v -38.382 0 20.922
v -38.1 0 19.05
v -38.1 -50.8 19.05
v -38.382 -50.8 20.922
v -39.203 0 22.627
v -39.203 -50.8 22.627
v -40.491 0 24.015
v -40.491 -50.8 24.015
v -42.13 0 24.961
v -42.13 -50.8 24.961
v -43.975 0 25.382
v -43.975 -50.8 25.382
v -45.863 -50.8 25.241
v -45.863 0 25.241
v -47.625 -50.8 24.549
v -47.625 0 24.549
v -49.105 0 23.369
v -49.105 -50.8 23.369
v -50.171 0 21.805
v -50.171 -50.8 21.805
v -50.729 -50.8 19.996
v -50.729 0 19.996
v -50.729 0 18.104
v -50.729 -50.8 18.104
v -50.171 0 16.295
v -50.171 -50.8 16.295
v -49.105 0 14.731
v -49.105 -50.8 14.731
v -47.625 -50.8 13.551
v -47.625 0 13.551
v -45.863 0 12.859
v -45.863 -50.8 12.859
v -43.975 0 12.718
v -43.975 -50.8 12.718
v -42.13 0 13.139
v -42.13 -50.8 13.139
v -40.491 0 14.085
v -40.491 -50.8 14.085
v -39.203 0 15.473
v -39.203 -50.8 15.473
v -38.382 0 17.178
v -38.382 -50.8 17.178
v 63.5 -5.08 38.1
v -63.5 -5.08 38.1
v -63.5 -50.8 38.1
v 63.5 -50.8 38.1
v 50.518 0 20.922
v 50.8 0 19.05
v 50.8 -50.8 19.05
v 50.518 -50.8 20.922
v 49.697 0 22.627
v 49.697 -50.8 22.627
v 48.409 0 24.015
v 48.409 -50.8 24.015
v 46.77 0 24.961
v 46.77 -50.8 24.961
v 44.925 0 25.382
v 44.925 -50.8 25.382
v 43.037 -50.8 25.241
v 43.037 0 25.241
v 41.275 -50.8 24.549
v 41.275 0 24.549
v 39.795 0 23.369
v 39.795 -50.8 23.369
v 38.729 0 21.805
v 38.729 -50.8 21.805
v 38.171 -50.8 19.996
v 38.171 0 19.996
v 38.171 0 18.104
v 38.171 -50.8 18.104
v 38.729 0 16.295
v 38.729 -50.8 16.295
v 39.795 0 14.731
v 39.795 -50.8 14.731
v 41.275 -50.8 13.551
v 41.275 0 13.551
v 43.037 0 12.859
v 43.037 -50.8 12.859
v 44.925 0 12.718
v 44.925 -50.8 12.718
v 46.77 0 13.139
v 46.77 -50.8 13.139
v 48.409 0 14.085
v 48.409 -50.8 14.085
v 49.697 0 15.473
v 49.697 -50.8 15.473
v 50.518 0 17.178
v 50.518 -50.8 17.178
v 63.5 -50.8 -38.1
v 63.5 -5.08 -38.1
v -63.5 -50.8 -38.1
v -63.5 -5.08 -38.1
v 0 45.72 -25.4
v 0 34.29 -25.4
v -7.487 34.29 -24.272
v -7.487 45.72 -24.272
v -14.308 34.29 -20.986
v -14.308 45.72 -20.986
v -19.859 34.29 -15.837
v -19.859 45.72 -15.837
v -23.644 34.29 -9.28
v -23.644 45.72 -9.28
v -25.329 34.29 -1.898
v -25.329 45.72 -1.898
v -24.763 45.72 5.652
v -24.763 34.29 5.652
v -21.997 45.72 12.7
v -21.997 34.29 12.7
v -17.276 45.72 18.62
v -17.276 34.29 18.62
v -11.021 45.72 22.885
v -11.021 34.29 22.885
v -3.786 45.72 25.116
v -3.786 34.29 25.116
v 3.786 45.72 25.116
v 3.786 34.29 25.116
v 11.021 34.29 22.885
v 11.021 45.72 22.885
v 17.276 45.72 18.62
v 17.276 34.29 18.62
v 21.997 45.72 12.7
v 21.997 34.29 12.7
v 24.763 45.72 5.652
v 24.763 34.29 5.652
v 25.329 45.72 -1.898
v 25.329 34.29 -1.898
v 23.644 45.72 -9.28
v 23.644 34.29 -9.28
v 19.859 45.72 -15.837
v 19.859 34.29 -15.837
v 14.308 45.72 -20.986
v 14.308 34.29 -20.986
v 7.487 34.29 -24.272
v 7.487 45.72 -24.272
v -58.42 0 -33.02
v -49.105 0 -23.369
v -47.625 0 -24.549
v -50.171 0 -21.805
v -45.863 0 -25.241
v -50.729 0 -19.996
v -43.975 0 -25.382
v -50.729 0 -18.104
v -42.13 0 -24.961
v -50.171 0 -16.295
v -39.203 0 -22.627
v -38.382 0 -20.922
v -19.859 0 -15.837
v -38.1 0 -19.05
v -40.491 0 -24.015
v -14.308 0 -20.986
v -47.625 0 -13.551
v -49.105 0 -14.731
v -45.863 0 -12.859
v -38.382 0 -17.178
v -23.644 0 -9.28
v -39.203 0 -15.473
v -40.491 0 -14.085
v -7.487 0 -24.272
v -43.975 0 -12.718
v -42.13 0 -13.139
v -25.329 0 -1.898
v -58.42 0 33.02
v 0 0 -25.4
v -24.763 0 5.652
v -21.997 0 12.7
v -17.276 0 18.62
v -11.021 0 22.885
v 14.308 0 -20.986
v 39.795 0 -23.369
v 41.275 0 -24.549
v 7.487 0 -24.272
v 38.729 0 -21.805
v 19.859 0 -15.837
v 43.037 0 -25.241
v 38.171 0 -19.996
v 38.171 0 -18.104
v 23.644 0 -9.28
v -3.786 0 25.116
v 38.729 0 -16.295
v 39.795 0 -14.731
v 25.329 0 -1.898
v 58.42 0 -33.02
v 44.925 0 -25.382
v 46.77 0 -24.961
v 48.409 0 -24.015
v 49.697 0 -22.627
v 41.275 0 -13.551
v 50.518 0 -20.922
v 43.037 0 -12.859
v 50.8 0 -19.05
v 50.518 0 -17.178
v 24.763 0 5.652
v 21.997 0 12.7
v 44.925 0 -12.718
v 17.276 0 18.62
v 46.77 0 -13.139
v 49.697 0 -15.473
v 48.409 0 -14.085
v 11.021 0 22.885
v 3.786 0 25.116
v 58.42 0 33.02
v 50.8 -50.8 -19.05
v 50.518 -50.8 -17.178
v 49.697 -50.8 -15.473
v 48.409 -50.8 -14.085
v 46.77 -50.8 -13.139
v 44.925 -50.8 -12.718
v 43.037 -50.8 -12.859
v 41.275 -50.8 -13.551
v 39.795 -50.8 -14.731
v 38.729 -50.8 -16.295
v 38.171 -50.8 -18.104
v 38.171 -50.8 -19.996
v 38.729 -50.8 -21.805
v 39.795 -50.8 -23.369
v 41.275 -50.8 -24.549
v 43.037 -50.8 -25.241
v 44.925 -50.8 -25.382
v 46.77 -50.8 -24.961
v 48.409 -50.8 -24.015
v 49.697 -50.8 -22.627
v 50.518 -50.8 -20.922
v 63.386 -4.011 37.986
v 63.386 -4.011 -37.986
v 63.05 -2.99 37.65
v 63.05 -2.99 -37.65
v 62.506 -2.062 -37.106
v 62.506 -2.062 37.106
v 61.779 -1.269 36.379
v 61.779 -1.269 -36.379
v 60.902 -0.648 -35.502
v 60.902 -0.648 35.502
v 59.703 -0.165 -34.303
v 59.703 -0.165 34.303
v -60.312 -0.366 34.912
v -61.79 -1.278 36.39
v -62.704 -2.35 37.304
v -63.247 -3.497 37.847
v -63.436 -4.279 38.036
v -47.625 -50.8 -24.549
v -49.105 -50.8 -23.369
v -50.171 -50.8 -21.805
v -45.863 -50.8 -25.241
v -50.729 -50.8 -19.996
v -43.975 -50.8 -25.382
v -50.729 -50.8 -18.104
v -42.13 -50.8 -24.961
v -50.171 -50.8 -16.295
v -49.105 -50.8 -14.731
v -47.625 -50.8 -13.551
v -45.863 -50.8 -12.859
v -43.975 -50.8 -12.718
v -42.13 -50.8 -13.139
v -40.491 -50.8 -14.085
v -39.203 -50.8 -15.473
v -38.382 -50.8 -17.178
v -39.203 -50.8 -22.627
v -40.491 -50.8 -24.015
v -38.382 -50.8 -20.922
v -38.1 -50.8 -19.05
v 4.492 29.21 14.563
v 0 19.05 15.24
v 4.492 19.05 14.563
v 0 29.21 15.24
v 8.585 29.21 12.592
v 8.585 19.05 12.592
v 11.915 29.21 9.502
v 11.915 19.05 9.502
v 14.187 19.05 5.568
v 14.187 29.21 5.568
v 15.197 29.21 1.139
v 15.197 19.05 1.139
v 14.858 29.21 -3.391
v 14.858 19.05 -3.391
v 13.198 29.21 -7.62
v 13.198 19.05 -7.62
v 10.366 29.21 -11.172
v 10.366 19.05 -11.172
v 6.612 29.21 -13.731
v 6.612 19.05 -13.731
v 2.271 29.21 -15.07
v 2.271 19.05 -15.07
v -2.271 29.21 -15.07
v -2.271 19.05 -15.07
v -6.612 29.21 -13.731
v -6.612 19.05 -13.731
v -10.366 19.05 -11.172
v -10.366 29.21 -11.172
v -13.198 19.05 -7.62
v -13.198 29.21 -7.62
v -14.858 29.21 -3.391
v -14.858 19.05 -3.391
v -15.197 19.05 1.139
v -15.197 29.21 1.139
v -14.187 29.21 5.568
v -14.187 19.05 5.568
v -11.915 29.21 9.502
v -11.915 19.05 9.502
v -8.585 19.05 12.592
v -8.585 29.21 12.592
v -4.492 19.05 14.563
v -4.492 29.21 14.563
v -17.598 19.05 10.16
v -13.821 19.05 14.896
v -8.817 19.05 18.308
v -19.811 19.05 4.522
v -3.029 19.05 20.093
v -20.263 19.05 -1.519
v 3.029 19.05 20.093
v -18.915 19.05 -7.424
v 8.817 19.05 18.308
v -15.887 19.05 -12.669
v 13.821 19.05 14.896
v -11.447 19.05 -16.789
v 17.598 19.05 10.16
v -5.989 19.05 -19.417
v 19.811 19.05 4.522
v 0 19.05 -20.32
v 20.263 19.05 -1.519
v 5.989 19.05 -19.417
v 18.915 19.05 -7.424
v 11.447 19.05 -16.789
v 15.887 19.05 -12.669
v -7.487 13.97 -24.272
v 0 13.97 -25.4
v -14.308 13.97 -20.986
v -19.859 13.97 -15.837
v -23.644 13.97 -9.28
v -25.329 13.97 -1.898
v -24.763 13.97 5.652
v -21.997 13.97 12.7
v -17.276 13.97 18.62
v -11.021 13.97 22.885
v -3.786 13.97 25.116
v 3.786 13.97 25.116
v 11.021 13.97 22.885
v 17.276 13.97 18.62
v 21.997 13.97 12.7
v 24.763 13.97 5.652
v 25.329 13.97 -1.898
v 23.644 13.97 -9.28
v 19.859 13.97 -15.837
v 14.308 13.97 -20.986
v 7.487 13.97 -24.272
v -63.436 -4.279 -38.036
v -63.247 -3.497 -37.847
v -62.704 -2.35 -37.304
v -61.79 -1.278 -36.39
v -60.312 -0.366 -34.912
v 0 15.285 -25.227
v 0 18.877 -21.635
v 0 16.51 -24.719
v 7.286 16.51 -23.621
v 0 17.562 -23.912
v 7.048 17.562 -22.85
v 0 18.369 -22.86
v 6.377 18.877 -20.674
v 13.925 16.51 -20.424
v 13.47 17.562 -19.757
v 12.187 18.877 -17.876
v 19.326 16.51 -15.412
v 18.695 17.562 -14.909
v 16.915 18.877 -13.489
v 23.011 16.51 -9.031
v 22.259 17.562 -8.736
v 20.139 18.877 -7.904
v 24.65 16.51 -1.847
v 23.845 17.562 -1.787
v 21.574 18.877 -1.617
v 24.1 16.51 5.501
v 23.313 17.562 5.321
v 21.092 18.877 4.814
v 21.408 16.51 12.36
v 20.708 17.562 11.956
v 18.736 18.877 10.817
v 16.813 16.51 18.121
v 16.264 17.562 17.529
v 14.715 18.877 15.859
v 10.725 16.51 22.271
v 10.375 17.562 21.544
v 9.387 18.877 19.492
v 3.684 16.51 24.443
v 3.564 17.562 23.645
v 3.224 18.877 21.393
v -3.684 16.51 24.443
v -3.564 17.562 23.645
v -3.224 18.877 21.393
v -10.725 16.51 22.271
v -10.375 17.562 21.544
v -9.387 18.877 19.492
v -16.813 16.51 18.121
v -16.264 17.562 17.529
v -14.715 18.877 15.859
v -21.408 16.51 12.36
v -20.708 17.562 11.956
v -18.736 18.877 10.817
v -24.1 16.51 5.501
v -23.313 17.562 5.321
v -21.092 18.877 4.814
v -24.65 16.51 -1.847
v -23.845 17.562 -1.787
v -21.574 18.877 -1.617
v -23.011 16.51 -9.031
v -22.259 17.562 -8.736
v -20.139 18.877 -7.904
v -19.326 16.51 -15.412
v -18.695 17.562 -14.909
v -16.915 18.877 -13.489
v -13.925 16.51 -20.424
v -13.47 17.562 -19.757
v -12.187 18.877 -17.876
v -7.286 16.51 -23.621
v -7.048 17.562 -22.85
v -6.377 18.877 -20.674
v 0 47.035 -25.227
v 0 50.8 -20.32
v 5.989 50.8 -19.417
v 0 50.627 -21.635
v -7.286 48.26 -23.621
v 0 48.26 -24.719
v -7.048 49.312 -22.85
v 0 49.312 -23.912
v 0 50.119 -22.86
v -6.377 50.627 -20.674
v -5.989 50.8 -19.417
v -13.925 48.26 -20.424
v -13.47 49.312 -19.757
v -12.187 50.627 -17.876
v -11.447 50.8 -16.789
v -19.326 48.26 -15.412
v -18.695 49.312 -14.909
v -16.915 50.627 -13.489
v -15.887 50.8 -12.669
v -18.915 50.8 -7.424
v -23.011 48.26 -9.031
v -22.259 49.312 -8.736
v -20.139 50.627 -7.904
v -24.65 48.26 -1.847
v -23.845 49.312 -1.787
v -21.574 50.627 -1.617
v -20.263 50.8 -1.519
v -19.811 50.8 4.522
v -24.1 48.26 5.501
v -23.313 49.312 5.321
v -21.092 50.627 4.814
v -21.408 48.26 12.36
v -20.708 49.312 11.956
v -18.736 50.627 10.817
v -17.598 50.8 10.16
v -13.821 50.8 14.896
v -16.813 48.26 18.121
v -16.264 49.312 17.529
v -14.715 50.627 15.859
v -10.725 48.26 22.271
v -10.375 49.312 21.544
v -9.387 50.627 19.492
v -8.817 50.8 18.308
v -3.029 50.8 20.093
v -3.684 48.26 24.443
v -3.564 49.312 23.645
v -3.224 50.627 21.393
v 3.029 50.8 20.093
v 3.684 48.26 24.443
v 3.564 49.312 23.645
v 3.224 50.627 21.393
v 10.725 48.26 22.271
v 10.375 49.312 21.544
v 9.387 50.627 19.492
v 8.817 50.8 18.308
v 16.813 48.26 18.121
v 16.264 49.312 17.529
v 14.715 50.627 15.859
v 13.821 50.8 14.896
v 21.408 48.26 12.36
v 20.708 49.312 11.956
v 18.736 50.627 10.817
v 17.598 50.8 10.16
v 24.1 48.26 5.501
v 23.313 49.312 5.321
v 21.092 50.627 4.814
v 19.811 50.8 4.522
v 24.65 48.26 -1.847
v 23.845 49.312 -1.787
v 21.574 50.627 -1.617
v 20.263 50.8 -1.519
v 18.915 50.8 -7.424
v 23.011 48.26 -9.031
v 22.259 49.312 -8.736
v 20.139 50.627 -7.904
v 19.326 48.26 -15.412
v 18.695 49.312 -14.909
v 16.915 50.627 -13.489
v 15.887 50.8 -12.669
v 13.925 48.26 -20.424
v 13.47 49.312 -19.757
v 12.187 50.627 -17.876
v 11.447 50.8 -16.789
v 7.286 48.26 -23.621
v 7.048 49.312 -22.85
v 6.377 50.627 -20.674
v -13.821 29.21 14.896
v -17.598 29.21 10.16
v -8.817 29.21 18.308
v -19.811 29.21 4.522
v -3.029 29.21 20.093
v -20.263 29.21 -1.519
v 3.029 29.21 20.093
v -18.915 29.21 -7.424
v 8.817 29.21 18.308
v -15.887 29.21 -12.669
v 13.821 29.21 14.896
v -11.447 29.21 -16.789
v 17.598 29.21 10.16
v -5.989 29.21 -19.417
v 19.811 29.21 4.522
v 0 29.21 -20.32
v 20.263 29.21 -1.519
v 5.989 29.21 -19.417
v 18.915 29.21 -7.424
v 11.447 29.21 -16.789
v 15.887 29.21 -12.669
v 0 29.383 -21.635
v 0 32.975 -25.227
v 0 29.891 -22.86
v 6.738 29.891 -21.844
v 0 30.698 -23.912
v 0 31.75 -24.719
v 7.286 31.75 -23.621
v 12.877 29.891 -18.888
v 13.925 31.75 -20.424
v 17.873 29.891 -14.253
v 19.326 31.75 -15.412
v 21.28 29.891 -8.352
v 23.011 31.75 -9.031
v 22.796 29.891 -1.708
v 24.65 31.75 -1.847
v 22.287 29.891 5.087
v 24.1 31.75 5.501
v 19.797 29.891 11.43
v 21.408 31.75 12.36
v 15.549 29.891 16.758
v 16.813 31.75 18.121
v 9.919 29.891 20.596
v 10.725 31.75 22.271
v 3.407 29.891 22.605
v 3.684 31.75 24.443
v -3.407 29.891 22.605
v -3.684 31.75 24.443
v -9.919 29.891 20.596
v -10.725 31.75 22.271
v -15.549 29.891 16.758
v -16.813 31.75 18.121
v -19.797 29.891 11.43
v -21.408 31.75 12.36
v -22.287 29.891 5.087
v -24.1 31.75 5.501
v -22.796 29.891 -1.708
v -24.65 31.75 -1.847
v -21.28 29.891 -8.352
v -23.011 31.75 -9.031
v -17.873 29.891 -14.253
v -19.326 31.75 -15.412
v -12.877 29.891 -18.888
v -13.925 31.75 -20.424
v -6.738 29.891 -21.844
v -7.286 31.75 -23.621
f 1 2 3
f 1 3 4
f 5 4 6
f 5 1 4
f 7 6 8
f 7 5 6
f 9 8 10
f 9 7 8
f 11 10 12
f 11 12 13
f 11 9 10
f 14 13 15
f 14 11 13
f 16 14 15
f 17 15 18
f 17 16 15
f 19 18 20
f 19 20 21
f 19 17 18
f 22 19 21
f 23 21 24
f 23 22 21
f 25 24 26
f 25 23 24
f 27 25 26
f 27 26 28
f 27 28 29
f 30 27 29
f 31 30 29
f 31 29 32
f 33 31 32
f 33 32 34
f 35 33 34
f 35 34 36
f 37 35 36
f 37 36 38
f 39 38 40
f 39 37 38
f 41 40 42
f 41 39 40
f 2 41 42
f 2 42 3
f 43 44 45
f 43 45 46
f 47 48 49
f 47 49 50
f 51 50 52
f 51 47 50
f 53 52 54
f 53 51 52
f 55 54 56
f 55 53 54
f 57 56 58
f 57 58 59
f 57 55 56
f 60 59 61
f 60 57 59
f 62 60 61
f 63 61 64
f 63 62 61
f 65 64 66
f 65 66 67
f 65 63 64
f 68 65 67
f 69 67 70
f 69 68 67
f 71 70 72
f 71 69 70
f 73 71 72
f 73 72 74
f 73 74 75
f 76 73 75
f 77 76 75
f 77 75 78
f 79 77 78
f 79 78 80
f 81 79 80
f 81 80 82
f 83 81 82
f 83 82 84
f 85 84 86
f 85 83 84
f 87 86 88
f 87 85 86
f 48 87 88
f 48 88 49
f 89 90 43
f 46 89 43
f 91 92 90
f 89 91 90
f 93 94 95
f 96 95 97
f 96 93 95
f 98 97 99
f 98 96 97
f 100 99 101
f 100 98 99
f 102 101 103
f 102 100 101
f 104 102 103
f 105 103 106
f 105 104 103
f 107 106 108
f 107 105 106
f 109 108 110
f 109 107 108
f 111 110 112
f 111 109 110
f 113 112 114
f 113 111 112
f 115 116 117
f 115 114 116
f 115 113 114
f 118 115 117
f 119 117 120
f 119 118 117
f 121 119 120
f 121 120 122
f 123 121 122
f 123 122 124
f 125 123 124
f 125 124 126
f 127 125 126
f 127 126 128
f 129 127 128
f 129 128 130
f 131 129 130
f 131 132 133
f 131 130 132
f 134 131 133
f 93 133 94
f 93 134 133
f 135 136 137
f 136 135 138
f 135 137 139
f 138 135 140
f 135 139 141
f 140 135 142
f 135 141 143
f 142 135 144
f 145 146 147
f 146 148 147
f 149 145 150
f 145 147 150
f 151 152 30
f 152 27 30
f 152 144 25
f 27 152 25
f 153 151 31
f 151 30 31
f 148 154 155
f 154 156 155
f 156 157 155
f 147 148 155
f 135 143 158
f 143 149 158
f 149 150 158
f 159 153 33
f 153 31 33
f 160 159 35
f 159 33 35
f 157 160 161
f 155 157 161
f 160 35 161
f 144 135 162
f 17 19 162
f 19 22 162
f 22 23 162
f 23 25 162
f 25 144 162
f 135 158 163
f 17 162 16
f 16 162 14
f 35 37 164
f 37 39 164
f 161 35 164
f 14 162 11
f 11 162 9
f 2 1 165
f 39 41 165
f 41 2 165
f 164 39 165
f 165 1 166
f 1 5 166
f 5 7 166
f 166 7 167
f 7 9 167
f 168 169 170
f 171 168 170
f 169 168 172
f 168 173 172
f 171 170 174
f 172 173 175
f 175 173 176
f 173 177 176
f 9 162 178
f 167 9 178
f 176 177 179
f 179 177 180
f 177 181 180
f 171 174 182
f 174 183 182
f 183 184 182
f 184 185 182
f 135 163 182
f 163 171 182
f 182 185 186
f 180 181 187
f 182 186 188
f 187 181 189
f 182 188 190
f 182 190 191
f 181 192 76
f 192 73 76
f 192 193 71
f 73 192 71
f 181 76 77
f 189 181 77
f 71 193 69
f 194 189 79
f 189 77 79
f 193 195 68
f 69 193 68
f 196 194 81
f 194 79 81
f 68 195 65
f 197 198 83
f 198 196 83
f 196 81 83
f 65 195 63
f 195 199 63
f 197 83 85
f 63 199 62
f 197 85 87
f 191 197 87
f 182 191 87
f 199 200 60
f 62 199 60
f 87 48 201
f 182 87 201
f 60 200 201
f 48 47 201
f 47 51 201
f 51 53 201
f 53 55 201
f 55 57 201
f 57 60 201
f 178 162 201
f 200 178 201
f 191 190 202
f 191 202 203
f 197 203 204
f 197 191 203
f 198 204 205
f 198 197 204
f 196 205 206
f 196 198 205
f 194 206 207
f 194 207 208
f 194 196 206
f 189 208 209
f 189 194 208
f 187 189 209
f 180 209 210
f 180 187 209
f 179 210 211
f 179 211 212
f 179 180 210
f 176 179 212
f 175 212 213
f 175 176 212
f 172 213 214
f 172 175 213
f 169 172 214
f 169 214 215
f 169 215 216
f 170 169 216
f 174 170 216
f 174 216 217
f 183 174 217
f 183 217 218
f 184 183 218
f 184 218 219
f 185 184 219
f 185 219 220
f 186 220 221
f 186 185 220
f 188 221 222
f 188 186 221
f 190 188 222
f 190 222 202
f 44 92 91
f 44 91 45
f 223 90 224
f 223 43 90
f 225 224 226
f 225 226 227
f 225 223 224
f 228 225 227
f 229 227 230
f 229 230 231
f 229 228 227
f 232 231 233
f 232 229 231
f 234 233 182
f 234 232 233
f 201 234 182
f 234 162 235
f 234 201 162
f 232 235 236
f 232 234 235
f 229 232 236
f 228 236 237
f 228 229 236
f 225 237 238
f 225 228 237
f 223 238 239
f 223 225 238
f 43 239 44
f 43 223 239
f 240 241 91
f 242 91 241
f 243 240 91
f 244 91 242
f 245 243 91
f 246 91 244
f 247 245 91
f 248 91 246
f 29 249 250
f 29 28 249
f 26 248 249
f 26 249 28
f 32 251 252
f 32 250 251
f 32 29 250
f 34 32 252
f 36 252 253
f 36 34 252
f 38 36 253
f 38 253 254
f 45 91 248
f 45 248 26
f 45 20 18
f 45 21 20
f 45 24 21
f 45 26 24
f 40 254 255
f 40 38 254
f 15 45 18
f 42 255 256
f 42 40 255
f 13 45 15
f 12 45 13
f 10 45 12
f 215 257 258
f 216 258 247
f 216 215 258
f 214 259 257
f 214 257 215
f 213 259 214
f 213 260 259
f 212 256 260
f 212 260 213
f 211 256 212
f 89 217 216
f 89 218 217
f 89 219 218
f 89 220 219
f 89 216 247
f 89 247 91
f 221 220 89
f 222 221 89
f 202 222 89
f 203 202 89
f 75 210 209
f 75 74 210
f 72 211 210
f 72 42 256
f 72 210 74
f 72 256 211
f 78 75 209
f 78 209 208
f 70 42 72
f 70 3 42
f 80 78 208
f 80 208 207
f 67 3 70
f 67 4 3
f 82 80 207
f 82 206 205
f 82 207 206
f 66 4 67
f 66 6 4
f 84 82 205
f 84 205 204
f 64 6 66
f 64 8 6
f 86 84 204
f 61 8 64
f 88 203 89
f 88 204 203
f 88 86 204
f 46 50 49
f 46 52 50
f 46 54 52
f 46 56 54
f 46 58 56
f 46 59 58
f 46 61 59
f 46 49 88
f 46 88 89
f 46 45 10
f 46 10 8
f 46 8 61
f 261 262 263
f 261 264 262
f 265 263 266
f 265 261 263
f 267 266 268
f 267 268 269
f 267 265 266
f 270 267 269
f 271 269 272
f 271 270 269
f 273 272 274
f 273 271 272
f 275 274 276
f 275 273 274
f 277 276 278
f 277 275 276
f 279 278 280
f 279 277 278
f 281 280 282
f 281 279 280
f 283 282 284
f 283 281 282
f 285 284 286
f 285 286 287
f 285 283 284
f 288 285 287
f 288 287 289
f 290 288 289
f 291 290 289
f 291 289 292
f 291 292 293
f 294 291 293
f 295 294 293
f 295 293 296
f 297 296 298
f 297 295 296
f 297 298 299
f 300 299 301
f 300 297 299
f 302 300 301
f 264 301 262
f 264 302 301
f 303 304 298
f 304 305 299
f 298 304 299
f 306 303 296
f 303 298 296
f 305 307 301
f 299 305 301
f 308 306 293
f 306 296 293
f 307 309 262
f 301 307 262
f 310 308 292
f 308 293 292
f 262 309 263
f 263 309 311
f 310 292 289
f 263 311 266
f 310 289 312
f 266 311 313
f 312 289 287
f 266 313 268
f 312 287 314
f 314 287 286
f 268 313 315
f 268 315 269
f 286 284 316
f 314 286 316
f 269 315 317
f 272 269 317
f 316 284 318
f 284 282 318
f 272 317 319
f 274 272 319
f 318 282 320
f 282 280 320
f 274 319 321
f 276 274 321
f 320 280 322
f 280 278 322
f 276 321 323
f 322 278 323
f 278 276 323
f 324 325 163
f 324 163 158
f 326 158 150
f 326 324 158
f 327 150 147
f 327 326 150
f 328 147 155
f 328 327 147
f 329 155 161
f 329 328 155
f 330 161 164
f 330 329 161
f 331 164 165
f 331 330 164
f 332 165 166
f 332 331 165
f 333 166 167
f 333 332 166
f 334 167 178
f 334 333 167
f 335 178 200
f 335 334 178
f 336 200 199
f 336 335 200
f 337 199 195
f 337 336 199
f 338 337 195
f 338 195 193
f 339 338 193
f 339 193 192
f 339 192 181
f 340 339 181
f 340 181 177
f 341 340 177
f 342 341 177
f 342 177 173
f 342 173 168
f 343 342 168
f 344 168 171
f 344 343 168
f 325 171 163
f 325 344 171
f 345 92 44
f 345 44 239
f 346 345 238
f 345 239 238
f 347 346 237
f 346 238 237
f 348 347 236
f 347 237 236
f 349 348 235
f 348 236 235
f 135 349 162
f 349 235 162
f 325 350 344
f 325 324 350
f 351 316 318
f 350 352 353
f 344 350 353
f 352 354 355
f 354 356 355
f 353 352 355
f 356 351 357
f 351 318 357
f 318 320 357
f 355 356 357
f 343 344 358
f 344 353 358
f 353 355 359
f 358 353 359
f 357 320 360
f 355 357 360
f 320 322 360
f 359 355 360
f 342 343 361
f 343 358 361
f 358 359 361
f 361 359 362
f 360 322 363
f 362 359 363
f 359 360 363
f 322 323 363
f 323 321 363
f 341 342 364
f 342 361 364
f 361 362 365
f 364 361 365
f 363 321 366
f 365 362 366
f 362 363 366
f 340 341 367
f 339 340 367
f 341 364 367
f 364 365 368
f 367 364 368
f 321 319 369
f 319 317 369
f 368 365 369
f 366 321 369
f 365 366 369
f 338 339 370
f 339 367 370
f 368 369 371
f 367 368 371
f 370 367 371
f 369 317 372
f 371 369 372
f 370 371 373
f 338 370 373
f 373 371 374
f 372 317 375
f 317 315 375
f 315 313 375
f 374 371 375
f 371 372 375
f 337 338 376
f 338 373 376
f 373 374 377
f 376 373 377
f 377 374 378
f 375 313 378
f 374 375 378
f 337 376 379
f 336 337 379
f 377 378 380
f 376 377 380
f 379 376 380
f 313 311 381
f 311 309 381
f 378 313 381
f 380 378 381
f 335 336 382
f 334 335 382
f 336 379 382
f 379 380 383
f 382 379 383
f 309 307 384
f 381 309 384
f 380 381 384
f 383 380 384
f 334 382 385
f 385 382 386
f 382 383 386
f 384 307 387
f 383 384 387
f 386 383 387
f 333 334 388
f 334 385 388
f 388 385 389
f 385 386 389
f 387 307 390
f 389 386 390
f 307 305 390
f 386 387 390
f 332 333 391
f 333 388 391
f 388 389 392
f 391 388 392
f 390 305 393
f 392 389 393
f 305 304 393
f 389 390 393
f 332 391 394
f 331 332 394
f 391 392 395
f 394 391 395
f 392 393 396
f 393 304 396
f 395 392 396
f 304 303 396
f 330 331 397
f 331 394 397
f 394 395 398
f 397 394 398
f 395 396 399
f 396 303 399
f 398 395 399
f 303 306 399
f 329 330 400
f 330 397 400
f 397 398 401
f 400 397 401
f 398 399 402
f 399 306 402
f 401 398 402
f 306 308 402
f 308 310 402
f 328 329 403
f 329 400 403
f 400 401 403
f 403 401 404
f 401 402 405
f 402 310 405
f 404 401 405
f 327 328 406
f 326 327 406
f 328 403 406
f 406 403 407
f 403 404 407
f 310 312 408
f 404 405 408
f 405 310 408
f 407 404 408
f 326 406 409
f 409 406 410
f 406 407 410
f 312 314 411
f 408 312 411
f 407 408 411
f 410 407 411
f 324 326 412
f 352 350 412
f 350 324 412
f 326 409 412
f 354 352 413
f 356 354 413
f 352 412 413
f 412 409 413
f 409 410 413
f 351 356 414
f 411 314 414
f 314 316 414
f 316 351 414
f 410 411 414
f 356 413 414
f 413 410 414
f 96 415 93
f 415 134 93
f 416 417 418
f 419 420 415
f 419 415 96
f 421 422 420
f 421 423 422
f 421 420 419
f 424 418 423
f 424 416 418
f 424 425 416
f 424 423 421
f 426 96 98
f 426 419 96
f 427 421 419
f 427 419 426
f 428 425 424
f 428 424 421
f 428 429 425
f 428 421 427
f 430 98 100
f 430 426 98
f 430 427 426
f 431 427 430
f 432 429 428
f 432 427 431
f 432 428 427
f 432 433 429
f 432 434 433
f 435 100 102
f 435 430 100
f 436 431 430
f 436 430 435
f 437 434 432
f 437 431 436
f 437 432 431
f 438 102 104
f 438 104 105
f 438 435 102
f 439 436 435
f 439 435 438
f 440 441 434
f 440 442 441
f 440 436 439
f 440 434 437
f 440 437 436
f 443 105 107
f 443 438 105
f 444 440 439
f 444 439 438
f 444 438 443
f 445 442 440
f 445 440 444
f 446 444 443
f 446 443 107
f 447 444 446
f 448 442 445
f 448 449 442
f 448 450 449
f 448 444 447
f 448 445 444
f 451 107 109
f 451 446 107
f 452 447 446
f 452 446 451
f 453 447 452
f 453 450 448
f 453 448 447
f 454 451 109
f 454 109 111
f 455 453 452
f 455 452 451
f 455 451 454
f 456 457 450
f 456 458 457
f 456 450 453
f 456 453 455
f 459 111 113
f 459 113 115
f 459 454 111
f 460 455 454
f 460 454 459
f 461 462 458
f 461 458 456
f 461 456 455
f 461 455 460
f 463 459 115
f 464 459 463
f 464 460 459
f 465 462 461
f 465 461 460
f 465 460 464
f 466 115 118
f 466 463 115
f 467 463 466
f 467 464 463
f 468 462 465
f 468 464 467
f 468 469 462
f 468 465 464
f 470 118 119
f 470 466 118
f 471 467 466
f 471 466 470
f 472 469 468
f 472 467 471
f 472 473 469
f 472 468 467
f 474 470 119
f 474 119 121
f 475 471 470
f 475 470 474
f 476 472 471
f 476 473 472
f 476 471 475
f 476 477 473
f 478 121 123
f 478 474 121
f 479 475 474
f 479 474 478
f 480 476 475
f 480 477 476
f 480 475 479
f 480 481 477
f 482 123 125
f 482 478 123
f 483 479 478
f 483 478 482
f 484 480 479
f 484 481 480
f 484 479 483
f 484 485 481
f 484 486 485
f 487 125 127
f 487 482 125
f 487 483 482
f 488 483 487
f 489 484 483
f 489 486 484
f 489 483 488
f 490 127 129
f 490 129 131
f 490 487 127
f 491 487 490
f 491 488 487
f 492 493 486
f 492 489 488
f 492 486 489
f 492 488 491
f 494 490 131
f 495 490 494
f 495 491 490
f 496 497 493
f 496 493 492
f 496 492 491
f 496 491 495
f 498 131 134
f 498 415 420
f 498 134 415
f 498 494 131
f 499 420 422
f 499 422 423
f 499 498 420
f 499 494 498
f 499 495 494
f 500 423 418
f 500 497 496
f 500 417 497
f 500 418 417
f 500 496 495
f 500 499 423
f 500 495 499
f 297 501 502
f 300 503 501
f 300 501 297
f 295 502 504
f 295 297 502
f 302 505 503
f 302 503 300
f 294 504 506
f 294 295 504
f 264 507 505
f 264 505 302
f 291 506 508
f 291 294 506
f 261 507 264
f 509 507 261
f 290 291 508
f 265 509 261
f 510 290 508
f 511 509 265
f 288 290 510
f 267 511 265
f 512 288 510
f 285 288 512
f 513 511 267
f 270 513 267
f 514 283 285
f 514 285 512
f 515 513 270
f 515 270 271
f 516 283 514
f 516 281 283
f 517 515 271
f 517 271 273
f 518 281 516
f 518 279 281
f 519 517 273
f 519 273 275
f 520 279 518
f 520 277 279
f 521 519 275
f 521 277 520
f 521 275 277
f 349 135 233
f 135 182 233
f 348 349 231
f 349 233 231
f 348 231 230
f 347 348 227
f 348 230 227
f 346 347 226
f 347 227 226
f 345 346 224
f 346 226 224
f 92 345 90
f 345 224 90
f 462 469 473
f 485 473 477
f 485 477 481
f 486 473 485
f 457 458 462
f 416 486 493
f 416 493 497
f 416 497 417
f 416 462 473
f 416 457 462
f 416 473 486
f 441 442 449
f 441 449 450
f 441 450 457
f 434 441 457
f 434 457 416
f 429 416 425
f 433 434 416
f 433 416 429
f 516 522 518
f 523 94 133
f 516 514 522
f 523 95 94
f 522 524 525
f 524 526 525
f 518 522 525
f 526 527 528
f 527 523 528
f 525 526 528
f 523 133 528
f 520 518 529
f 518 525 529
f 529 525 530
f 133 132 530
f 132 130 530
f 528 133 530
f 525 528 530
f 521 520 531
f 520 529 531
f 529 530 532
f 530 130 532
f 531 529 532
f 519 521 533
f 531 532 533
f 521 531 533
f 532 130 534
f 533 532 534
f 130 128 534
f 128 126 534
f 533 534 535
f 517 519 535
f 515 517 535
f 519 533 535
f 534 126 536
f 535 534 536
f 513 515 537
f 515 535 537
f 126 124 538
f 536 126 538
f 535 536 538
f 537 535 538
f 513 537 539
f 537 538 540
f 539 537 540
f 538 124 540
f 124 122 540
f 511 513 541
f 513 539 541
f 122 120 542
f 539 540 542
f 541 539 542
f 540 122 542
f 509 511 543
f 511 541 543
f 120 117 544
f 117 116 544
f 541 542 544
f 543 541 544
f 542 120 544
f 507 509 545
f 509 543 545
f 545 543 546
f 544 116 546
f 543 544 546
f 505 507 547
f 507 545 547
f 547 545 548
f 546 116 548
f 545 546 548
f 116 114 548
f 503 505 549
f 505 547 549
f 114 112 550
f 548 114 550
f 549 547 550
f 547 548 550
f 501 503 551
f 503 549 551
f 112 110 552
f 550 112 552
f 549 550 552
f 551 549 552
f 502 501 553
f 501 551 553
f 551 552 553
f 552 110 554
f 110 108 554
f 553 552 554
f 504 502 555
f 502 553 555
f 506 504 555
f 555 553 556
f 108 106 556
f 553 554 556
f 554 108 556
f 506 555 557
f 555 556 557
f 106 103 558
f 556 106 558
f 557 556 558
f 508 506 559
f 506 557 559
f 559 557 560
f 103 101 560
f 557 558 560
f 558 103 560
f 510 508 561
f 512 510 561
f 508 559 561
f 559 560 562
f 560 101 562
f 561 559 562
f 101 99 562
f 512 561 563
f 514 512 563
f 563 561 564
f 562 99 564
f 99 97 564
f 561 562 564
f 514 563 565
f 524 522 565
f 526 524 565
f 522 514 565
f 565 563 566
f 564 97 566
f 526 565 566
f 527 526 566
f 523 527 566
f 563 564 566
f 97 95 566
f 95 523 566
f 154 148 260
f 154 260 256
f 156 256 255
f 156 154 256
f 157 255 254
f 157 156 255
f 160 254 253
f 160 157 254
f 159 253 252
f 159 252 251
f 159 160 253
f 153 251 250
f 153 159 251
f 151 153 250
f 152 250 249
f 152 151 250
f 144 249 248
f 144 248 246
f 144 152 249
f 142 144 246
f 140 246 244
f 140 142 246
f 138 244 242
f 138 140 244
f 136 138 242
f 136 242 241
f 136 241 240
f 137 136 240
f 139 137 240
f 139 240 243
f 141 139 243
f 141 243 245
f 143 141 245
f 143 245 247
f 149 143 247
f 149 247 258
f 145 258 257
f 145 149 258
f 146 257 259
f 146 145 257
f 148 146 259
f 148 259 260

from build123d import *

# Parameters (mm, degrees)
F0_W     = 127
F0_H     = 76.2
F0_R     = 6.35
F1_DEPTH = 50.8
F3_W     = 50.8
F3_H     = 25.4
F5_W     = 10.16
F5_H     = 10.16
F7_R     = 5.08


with BuildPart() as f1:
    # F0 (on Front) → F1 (new body)
    with BuildSketch(Plane.XZ):
        Rectangle(F0_W, F0_H)
        with Locations((-44.45, -19.05)):
            Circle(F0_R, mode=Mode.SUBTRACT)
        with Locations((44.45, -19.05)):
            Circle(F0_R, mode=Mode.SUBTRACT)
        with Locations((-44.45, 19.05)):
            Circle(F0_R, mode=Mode.SUBTRACT)
        with Locations((44.45, 19.05)):
            Circle(F0_R, mode=Mode.SUBTRACT)
    extrude(amount=F1_DEPTH)

    # F3 (on Right) → F4 (revolve)
    with BuildSketch(Plane.YZ):
        with Locations((25.4, -12.7)):
            Rectangle(F3_W, F3_H)
    revolve(axis=Axis((0, 25.4, 0), (0, 1, 0)))

    # F5 (on Right) → F6 (revolve, cut)
    with BuildSketch(Plane.YZ):
        with Locations((24.13, 20.32)):
            Rectangle(F5_W, F5_H)
    revolve(axis=Axis((0, 38.364865, 0), (0, 1, 0)), mode=Mode.SUBTRACT)

    # F7
    f7_edges = [f1.edges().sort_by_distance(p)[0] for p in [
        (63.5, 0, 0),
        (0, 0, 38.1),
        (0, 0, -38.1),
        (-63.5, 0, 0),
        (0, 19.05, 25.4),
        (0, 29.21, 25.4),
        (0, 50.8, 25.4),
    ]]
    fillet(f7_edges, radius=F7_R)


solid = f1.part
